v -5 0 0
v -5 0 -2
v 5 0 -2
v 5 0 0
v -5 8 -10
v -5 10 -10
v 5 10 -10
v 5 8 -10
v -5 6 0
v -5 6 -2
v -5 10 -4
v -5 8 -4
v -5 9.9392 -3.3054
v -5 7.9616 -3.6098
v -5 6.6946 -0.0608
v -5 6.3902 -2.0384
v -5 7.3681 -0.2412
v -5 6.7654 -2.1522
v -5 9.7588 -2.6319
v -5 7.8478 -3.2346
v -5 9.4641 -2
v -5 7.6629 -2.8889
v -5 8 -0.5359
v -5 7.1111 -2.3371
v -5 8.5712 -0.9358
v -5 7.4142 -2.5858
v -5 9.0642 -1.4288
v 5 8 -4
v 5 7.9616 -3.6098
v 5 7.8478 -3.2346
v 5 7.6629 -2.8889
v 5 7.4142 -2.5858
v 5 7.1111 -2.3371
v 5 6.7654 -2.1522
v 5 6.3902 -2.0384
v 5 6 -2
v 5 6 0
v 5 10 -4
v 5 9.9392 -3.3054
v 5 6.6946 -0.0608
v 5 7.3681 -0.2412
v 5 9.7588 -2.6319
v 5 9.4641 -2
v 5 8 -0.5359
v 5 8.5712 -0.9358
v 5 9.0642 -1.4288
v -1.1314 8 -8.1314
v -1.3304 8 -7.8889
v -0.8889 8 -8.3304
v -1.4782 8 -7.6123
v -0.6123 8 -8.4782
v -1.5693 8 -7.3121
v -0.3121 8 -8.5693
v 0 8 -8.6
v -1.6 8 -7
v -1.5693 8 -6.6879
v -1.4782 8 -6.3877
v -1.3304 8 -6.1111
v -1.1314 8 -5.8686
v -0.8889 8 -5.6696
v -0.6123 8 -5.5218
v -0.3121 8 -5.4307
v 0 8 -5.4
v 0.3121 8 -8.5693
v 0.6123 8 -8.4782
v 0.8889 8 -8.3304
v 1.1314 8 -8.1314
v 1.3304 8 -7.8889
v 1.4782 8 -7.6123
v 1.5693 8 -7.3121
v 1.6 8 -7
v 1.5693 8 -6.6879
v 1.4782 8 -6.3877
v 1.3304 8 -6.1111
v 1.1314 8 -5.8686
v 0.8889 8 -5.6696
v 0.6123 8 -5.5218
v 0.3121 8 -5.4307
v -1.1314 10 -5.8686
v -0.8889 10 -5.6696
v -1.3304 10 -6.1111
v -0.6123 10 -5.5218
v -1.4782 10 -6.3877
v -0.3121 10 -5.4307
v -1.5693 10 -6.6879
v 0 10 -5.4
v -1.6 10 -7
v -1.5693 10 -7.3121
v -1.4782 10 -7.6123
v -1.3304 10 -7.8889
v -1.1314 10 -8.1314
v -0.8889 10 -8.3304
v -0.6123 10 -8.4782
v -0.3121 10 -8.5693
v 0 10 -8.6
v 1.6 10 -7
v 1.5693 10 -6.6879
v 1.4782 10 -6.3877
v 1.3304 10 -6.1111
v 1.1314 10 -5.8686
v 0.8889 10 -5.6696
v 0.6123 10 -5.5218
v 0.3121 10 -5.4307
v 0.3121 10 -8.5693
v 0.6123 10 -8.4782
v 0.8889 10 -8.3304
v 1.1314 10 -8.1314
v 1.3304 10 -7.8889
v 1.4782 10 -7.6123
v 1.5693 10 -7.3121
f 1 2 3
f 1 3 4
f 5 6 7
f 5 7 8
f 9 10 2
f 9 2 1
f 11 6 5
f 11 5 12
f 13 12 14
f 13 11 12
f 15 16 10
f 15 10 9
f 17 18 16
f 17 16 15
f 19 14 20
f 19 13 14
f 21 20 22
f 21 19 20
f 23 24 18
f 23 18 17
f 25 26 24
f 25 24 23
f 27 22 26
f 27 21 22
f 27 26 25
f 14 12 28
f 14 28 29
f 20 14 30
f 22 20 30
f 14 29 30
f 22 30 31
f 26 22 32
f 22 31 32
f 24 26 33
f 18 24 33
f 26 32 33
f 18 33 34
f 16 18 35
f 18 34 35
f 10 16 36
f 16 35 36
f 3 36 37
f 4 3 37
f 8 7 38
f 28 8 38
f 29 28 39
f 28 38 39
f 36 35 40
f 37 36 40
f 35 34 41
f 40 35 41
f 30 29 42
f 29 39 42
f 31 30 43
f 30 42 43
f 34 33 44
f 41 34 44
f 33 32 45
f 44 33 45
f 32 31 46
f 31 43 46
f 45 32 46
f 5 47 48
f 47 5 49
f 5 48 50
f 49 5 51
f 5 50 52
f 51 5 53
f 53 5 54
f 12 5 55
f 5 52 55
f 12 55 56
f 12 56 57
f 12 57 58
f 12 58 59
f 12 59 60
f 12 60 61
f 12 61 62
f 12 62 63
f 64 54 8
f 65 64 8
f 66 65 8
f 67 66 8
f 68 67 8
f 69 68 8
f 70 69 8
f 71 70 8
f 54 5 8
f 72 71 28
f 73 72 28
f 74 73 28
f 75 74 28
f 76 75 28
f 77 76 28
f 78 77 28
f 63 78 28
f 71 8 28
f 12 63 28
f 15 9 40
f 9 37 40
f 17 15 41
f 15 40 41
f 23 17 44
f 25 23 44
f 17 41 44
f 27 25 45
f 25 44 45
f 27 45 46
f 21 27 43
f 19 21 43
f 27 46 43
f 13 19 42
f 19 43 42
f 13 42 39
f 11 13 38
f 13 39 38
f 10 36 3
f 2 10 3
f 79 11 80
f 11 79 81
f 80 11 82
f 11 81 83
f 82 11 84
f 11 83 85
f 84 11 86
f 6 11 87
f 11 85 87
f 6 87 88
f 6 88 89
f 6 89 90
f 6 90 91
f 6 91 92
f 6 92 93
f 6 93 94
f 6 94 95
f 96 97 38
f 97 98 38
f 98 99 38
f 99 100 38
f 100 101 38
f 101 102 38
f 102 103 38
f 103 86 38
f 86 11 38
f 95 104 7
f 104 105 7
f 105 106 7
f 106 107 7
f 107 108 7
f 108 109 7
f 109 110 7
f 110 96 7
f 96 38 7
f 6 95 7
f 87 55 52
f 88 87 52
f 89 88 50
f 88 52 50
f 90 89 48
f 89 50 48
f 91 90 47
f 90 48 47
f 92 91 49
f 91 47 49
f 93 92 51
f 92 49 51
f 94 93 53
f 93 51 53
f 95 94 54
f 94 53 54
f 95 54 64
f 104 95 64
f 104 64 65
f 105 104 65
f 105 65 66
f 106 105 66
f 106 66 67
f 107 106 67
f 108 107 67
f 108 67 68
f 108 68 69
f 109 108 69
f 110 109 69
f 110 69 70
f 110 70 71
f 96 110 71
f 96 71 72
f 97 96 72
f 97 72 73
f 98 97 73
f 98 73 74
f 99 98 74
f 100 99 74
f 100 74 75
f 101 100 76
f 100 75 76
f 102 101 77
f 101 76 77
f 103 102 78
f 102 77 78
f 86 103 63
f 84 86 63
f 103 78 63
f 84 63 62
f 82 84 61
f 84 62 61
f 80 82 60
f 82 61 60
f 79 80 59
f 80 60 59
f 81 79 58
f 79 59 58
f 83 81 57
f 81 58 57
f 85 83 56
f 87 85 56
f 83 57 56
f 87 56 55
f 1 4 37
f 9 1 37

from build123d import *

# Parameters (mm, degrees)
EXTRUDE_1_DEPTH    = 5
HOLE_WIZARD_M3_1_D = 3.2


with BuildPart() as part:
    # 草图1 → 拉伸-薄壁1 (new, symmetric)
    with BuildSketch(Plane(origin=(0, 0, 0), x_dir=(0, 0, -1), z_dir=(1, 0, 0))):
        with BuildLine():
            Line((0, 0), (0, 6))
            ThreePointArc((0, 6), (1.171572875, 8.828427125), (4, 10))
            Line((4, 10), (10, 10))
            Line((10, 10), (10, 8))
            Line((10, 8), (4, 8))
            ThreePointArc((4, 8), (2.585786438, 7.414213562), (2, 6))
            Line((2, 6), (2, 0))
            Line((2, 0), (0, 0))
        make_face()
    extrude(amount=EXTRUDE_1_DEPTH, both=True)

    # M3 间隙孔1 (through all)
    with Locations(Plane(origin=(0, 10, 0), x_dir=(1, 0, 0), z_dir=(0, 1, 0))):
        with Locations((0, 7)):
            Hole(HOLE_WIZARD_M3_1_D / 2)


solid = part.part
